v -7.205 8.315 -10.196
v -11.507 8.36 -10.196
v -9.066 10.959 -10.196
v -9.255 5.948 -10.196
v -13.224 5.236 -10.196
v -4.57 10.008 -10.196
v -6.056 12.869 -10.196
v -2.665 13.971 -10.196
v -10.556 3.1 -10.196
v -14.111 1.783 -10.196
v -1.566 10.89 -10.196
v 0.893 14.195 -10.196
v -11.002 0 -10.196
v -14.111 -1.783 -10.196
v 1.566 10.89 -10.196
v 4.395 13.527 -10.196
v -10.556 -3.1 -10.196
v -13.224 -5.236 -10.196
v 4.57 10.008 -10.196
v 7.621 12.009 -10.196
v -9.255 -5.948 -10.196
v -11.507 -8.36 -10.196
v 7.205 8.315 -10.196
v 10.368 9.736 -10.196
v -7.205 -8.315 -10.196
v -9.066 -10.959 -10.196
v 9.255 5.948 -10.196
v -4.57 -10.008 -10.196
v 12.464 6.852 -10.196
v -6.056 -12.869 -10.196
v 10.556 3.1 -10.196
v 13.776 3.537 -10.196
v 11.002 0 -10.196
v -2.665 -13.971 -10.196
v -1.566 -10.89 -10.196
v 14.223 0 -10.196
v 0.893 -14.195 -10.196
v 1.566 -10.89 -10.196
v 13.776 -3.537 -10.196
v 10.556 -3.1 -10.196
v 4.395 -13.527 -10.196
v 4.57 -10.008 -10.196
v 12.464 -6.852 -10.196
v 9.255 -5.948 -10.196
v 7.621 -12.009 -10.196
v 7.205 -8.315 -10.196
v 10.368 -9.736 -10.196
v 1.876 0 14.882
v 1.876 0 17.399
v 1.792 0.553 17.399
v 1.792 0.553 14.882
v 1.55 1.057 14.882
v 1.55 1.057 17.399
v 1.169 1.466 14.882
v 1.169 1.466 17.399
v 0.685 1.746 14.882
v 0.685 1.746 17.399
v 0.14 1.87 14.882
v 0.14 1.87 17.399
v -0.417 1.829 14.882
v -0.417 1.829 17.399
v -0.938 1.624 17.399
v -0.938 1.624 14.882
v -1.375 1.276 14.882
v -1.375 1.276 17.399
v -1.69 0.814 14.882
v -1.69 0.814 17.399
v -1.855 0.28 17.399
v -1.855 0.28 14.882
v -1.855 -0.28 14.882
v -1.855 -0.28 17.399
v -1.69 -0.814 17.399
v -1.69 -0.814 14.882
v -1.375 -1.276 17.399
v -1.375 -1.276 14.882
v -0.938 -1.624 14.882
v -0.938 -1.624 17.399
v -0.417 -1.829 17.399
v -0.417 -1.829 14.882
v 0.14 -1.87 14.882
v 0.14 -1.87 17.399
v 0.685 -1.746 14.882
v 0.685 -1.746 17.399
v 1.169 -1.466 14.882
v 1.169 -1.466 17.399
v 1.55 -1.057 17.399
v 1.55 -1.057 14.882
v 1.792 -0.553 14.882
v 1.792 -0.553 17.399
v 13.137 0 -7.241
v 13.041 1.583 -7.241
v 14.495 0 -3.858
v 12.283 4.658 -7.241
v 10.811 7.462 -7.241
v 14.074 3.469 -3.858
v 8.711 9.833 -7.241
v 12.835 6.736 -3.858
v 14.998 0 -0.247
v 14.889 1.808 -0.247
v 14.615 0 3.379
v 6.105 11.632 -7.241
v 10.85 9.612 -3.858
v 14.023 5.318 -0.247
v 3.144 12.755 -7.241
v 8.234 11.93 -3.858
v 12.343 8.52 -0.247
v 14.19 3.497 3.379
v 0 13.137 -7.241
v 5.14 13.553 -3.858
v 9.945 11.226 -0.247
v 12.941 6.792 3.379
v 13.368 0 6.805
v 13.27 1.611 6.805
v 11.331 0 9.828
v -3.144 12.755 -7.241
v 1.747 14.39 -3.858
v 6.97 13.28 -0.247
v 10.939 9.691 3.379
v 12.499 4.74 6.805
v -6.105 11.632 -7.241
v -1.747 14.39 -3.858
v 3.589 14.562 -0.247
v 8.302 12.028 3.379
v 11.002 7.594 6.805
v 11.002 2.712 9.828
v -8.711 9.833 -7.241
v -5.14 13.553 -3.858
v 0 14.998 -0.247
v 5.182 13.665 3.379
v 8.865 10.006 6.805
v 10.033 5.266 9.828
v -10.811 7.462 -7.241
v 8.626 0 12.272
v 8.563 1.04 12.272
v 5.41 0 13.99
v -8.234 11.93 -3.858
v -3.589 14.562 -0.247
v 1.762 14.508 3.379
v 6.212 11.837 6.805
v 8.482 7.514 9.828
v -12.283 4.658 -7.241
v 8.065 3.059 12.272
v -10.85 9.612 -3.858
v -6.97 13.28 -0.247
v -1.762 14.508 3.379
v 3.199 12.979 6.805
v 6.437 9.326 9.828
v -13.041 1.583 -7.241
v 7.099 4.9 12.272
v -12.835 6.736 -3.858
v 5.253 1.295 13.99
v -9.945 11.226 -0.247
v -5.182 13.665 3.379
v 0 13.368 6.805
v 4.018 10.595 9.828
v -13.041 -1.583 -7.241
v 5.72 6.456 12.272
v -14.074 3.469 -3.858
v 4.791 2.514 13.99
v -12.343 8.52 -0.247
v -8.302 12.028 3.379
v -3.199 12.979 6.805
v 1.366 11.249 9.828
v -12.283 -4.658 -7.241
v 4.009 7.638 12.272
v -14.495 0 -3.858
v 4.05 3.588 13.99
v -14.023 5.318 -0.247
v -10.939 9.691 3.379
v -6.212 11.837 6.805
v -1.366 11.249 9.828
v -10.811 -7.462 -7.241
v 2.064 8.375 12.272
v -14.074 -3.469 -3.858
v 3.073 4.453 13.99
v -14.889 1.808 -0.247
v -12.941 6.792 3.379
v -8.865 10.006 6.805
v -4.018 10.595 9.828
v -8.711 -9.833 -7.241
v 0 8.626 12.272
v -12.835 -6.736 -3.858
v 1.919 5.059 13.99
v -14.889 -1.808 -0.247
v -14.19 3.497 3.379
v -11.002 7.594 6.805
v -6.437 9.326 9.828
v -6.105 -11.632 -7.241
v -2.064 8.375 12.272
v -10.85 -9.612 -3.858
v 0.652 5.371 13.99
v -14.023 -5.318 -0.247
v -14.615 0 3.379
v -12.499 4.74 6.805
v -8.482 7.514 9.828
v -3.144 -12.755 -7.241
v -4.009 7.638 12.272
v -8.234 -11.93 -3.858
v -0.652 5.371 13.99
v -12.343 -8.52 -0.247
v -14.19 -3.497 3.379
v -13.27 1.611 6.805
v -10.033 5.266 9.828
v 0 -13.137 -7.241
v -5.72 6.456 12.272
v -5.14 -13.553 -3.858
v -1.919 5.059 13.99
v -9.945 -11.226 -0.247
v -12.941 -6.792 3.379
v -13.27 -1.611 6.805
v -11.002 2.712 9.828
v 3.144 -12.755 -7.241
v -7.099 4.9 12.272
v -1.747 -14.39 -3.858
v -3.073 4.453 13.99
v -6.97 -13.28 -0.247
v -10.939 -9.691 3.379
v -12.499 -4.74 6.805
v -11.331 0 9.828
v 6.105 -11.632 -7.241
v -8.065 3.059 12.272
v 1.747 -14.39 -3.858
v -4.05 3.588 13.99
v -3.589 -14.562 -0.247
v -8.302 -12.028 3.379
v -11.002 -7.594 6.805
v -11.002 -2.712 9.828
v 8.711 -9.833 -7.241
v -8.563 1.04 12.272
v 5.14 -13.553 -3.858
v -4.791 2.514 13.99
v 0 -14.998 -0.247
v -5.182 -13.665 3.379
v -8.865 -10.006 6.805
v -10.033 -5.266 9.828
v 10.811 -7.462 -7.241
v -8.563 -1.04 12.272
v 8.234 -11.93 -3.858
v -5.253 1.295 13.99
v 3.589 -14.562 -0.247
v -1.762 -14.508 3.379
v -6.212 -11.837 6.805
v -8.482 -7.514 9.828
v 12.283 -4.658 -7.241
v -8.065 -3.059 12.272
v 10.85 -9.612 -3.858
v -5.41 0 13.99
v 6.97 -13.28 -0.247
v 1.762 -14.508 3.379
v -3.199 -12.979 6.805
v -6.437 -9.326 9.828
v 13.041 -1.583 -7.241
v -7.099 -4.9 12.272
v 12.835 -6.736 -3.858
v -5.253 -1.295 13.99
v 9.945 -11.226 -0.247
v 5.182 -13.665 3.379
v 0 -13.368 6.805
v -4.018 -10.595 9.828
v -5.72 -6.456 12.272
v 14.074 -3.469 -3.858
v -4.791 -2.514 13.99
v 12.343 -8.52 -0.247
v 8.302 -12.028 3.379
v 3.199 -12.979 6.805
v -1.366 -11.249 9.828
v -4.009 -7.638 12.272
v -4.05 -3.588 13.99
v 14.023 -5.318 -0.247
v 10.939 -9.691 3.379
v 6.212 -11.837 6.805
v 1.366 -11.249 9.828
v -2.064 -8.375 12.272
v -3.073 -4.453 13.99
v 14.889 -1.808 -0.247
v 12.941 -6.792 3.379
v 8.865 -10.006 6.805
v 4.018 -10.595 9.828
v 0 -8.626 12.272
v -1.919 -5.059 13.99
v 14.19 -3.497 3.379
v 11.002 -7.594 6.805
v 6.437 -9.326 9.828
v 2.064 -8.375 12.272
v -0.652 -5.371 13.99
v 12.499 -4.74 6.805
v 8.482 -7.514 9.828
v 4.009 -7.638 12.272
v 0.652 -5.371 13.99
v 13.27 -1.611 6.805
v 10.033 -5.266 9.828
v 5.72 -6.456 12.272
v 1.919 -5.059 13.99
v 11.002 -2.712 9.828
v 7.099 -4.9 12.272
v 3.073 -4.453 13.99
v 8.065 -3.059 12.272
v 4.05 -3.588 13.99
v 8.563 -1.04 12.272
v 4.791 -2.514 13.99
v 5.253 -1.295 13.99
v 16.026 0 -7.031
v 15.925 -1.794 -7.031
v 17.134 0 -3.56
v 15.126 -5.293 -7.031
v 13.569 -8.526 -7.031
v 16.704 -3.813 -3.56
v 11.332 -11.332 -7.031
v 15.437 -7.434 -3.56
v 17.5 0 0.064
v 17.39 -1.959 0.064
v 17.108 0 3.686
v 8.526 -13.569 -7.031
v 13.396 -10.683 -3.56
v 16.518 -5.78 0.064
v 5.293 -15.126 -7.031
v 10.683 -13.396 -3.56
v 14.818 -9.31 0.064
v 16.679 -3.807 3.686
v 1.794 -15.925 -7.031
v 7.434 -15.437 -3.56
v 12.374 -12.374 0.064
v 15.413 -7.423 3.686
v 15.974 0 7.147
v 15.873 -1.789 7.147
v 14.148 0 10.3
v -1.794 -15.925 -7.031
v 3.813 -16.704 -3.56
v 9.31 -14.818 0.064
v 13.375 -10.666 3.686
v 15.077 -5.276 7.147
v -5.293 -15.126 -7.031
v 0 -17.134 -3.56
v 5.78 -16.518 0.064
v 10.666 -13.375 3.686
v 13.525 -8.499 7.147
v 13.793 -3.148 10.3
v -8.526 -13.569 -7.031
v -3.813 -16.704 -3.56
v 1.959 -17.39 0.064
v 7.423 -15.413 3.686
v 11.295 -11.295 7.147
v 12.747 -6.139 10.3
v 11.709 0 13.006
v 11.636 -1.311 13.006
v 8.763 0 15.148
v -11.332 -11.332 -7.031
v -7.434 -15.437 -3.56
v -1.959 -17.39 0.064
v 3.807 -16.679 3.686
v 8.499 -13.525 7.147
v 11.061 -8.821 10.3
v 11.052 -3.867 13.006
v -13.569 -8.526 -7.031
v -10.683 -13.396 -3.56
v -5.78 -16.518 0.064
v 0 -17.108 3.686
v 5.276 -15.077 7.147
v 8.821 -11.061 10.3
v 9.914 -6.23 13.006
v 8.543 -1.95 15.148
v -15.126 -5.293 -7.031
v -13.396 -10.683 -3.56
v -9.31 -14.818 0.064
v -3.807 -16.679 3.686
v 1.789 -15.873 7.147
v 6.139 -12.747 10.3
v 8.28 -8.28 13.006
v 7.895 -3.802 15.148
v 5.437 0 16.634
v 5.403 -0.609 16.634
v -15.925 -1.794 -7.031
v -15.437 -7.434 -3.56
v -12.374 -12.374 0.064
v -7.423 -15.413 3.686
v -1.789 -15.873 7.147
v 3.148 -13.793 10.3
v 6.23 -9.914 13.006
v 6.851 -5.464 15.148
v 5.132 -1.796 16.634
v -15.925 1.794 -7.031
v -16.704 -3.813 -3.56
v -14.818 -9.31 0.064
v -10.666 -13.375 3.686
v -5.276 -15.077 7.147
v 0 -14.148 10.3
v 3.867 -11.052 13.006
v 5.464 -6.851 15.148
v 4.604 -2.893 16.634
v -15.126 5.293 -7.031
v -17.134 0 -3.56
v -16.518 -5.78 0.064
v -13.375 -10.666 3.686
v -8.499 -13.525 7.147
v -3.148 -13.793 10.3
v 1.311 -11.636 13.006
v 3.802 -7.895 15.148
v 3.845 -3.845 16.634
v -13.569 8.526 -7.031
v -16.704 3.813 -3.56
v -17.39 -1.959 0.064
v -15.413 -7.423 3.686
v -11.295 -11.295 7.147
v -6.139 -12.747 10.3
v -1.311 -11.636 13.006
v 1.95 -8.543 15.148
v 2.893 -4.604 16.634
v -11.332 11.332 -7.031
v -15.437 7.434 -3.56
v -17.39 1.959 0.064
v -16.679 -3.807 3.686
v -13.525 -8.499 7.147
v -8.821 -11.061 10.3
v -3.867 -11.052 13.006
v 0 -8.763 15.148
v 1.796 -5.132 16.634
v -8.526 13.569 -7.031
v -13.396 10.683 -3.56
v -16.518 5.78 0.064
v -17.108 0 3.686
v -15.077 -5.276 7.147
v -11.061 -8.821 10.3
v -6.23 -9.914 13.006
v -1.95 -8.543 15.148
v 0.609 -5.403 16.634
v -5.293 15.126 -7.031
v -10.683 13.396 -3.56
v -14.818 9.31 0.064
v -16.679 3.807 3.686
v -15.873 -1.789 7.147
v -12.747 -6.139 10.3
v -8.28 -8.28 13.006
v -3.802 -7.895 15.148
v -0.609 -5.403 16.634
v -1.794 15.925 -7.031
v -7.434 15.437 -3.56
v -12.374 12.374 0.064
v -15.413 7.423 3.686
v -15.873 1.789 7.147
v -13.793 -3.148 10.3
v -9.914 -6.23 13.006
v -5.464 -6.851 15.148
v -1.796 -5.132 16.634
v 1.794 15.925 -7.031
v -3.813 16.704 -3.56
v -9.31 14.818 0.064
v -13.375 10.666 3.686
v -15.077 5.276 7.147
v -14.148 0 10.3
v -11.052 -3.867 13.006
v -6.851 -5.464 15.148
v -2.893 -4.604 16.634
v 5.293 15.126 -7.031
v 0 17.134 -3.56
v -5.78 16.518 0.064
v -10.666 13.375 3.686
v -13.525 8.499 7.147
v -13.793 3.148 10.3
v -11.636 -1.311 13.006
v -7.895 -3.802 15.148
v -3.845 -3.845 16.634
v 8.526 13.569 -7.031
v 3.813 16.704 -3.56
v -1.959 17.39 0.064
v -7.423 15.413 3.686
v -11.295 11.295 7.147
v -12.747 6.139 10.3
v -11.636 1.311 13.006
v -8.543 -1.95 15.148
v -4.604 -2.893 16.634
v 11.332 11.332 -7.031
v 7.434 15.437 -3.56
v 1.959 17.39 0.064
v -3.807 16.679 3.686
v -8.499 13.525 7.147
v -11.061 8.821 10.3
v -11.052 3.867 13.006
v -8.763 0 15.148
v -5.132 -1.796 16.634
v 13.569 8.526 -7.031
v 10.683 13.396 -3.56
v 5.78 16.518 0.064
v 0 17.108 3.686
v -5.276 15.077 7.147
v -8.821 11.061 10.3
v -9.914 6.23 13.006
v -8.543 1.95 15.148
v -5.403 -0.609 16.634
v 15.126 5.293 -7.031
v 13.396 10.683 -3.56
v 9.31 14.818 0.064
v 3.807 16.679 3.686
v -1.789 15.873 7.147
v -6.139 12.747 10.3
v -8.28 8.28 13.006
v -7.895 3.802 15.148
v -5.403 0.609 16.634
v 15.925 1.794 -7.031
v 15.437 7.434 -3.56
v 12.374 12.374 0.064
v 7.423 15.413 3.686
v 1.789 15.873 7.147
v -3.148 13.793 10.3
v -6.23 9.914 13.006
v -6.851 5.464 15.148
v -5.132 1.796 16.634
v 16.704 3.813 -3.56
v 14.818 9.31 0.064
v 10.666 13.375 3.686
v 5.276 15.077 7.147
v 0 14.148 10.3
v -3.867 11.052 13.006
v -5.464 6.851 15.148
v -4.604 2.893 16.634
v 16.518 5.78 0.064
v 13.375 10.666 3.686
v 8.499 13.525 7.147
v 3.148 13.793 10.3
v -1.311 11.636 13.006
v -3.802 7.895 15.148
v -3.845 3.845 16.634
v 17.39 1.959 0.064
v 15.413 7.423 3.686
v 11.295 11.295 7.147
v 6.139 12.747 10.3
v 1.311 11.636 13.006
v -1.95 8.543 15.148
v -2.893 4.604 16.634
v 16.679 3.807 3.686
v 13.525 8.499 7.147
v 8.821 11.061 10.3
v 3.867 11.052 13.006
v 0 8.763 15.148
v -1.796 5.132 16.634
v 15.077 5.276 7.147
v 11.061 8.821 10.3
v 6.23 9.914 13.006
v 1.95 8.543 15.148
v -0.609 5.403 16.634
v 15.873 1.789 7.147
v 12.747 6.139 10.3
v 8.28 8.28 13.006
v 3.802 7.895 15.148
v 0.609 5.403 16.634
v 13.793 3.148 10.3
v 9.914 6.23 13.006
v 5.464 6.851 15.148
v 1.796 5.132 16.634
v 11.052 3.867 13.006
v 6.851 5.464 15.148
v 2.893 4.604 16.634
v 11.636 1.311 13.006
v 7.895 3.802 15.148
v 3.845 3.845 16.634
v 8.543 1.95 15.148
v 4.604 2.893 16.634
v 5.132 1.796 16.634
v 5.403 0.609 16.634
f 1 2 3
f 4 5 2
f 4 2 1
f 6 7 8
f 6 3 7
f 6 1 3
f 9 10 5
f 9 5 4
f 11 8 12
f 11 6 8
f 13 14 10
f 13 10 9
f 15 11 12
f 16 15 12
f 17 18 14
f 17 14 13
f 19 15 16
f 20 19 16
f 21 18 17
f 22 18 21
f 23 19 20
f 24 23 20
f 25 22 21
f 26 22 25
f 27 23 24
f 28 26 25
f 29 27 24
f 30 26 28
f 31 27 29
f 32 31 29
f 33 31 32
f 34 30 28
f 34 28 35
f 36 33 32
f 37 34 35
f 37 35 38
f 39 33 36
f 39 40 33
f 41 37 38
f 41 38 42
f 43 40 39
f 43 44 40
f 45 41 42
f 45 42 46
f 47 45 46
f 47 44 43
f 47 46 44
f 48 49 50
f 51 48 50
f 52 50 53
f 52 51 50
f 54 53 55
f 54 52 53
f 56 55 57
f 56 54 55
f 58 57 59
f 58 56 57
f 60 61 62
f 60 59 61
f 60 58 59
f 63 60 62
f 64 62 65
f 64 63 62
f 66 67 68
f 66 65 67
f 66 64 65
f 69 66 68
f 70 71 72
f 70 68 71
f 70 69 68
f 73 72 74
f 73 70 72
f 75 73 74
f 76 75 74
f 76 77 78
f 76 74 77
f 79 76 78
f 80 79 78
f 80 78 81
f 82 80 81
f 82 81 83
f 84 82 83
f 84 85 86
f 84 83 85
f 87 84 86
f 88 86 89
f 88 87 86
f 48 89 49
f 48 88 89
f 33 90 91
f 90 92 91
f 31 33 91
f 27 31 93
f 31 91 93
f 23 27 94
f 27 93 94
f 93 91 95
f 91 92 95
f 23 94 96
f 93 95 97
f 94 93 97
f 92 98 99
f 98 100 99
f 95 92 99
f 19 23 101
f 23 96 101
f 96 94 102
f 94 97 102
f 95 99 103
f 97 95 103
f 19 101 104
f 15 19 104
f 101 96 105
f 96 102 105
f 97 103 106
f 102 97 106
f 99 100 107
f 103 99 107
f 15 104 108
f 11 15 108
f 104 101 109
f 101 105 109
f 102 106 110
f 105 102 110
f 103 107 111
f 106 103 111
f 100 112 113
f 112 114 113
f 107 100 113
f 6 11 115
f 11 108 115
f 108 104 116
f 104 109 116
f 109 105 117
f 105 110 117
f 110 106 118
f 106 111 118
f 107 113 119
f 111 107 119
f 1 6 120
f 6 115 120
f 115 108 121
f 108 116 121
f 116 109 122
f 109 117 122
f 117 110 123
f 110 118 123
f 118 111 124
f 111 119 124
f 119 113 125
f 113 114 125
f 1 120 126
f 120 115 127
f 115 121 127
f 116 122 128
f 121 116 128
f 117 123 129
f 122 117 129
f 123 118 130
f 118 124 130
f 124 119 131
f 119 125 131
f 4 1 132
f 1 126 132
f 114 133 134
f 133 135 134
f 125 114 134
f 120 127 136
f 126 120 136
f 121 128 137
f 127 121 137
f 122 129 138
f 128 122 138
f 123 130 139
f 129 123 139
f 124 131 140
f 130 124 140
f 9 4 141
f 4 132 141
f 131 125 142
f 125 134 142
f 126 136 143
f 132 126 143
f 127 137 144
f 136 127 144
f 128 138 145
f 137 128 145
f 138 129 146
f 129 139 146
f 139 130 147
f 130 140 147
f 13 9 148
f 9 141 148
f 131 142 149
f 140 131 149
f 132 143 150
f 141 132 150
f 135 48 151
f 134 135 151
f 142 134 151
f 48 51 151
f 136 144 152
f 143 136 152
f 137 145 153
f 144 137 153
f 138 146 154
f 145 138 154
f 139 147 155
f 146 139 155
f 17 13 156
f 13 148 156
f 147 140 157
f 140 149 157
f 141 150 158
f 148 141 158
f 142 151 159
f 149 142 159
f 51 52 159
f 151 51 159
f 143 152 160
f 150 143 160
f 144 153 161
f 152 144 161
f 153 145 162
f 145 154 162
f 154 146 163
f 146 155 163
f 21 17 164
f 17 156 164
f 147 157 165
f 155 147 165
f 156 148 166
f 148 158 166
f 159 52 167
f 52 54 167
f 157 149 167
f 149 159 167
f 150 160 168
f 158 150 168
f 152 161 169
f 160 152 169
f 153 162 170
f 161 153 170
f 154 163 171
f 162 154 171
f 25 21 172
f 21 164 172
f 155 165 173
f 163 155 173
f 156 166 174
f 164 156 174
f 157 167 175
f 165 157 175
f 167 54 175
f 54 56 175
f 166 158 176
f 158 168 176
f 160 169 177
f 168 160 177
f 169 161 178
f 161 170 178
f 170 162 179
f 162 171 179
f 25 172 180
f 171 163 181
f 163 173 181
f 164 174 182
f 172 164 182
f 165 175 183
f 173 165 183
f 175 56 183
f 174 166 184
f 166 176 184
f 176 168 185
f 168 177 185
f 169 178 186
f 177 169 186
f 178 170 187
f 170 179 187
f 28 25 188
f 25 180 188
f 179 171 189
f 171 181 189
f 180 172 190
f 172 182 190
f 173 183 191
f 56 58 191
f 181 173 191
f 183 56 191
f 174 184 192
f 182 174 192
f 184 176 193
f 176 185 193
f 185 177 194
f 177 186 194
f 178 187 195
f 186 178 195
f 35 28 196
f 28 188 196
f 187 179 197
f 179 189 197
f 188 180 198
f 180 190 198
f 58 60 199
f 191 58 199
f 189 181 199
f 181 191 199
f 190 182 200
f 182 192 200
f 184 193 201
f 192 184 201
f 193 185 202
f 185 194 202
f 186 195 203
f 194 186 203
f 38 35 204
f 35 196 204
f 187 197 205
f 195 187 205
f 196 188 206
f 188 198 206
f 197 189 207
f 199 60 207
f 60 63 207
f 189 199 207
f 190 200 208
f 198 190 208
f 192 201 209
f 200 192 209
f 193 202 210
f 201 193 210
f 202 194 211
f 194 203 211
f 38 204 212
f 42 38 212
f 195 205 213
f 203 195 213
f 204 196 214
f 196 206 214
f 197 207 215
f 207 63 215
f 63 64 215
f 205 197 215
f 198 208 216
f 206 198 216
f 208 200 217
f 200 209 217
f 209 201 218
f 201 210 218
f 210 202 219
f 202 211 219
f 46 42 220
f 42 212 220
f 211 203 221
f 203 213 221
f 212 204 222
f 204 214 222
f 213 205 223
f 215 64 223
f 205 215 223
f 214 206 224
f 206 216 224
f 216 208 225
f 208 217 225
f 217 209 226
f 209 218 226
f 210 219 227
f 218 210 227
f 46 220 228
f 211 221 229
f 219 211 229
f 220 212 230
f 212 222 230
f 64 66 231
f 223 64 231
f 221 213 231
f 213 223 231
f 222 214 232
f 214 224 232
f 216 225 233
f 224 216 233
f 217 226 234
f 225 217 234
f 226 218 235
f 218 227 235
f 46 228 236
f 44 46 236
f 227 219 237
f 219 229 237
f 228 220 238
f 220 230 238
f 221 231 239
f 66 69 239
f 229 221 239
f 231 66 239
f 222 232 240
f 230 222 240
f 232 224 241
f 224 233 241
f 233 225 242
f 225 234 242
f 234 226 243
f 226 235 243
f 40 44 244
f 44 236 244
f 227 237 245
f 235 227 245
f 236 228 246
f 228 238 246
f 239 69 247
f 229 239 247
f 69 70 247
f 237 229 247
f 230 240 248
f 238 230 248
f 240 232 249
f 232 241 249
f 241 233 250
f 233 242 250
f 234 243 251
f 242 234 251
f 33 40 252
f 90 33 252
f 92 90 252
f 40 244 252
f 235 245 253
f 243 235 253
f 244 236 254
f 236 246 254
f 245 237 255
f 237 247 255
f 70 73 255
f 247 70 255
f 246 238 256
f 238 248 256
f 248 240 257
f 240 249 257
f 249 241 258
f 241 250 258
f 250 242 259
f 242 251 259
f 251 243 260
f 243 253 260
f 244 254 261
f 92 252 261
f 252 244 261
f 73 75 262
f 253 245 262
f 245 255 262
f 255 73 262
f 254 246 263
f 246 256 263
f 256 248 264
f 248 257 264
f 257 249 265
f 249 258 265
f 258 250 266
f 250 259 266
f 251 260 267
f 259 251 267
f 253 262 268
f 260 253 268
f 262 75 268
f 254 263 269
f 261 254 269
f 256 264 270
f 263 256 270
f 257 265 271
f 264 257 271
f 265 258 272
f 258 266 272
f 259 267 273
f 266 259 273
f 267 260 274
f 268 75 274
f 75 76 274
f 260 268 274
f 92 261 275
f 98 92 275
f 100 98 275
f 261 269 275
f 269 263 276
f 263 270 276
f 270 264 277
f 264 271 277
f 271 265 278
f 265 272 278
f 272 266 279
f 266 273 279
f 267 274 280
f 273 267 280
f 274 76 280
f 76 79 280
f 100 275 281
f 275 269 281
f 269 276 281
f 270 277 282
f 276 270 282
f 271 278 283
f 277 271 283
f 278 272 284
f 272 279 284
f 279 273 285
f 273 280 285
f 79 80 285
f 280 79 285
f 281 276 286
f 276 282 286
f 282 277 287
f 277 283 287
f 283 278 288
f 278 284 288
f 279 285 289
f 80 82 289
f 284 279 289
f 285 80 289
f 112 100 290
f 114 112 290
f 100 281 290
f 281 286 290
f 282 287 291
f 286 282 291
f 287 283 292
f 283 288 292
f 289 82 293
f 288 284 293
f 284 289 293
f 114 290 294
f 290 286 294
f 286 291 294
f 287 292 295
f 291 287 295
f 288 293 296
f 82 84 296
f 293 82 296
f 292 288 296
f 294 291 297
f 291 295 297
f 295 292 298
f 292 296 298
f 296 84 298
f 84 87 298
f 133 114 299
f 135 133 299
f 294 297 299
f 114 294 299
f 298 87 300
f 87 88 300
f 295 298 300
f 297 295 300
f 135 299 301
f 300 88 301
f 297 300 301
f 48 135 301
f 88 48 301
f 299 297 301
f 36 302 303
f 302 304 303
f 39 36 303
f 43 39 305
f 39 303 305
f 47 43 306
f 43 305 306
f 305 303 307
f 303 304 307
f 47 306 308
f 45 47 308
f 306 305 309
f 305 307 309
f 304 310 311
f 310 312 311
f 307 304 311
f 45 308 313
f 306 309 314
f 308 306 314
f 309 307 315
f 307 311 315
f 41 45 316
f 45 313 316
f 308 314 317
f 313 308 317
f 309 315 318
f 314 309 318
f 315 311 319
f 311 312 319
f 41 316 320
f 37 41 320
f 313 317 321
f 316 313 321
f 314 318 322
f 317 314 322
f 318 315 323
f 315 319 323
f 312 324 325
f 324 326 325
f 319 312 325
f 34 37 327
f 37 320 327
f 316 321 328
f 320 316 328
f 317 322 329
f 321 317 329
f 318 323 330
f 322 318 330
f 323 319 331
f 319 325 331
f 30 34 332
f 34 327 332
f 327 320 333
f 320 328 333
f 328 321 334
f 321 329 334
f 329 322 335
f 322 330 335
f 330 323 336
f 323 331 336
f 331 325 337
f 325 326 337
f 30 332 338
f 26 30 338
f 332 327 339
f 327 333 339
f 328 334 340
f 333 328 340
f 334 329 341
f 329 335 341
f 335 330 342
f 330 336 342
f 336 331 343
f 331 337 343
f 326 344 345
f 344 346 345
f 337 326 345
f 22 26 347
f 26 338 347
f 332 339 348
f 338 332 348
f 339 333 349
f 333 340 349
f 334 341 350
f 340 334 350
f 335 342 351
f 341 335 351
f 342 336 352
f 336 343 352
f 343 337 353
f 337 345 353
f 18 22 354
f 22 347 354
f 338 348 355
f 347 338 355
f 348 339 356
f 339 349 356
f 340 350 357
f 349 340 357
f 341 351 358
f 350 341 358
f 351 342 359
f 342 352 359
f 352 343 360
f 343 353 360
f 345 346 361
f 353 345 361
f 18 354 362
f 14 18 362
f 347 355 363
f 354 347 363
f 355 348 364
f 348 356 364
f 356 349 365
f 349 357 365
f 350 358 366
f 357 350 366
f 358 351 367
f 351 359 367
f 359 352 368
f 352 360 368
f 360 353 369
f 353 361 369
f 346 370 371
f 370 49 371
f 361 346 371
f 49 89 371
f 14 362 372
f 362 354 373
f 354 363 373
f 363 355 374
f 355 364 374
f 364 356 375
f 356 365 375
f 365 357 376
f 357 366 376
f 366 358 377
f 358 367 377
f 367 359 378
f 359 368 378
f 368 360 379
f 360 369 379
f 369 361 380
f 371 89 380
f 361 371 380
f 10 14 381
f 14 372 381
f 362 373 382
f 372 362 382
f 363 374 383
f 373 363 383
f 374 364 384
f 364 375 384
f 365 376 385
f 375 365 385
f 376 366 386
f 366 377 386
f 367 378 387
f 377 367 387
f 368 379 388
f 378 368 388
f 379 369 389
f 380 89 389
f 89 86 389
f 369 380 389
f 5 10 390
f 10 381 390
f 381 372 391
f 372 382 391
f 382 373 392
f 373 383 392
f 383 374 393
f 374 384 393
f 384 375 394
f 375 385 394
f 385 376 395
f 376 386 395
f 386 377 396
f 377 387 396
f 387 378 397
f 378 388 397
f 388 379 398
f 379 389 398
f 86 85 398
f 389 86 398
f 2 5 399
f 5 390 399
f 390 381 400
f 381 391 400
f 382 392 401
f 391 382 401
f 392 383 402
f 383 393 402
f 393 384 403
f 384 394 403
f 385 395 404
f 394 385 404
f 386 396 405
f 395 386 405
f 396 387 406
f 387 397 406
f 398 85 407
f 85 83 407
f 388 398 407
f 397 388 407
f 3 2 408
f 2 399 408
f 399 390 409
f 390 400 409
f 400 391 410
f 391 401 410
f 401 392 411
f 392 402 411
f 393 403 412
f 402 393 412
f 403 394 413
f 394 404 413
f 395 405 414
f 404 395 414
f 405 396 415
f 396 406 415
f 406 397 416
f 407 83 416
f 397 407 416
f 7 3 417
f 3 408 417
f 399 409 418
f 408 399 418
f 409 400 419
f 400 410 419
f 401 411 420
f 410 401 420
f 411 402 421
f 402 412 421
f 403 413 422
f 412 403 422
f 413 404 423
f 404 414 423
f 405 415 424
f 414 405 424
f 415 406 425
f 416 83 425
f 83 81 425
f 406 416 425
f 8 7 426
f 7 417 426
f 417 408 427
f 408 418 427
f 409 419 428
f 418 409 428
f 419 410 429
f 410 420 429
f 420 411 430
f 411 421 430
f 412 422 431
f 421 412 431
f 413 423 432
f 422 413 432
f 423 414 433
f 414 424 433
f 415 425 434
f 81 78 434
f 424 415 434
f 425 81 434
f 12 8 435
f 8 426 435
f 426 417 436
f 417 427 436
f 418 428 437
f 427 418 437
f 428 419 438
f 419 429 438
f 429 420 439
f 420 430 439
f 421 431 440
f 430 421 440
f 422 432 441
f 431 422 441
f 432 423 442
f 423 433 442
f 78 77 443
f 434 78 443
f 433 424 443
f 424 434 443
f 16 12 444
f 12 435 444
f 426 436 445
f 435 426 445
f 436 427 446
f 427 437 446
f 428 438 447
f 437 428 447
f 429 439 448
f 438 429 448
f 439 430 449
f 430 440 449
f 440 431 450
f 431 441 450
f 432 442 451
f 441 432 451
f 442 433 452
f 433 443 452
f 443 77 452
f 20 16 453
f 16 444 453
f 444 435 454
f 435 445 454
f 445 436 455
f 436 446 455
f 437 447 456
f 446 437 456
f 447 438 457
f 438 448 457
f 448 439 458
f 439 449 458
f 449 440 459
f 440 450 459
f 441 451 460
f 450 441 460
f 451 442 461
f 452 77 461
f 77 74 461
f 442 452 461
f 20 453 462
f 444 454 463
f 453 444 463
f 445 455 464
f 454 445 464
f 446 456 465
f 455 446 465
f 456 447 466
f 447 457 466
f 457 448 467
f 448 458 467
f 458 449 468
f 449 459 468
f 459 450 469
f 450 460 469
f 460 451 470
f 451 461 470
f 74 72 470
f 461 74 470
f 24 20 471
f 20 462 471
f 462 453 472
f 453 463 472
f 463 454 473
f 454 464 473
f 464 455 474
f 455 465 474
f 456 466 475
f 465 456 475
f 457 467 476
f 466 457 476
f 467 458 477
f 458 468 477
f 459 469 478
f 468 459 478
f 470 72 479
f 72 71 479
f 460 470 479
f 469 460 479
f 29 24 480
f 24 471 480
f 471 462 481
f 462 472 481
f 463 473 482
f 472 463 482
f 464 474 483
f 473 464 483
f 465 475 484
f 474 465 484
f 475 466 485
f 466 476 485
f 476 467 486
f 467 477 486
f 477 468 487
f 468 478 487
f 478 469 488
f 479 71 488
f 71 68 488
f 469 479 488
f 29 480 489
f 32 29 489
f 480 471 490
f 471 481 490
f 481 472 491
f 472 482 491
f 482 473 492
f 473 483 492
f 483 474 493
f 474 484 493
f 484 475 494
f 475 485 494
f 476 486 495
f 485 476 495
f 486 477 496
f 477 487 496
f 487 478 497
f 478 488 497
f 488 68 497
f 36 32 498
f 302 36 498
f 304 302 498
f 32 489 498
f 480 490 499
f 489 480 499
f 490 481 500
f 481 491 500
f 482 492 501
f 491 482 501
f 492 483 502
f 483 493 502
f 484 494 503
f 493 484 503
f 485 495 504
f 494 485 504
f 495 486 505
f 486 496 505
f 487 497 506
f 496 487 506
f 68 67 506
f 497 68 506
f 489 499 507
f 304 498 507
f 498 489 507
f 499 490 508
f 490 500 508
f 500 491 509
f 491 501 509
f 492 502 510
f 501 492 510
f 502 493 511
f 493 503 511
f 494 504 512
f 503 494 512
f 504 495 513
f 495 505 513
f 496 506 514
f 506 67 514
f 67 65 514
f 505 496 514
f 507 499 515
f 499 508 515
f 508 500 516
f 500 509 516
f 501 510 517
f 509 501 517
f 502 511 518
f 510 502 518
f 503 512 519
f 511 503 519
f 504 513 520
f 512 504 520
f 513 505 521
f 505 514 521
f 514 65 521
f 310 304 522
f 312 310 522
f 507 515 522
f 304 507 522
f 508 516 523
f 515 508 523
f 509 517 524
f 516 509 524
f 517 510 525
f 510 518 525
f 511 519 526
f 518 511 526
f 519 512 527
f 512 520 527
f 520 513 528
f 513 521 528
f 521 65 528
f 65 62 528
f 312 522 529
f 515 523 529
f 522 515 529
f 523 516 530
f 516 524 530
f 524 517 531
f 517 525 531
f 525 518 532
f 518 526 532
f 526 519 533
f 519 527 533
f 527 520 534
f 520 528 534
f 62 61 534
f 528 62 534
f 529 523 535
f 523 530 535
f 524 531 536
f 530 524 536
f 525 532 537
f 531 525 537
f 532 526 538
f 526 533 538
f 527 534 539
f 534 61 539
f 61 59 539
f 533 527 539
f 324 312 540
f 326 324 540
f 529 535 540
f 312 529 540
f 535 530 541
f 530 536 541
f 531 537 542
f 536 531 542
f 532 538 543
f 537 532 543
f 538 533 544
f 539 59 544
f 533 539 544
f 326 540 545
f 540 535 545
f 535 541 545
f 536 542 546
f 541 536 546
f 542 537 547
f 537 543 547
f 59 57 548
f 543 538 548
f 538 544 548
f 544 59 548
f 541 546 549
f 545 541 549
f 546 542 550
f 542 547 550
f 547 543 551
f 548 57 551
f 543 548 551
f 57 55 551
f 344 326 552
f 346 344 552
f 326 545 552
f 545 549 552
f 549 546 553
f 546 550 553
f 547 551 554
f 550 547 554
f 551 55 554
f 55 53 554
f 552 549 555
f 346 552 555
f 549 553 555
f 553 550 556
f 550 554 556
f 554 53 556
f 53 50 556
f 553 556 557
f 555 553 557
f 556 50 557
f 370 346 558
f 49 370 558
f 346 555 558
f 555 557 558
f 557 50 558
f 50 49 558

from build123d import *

# Parameters (mm, degrees)
F5_W     = 42.267536
F5_H     = 10.794579
F6_DEPTH = 30
F7_R     = 1.875564
F8_DEPTH = 25


with BuildPart() as f1:
    # F0 (on Front) → F1 (revolve)
    with BuildSketch(Plane.XZ):
        with BuildLine():
            Line((0, 0), (0, -17.5))
            ThreePointArc((0, -17.5), (17.5, 0), (0, 17.5))
            Line((0, 17.5), (0, 0))
        make_face()
    revolve(axis=Axis((0, 0, -8.75), (0, 0, -1)))


with BuildPart() as f3:
    # F2 (on Front) → F3 (revolve)
    with BuildSketch(Plane.XZ):
        with BuildLine():
            Line((0, 15), (0, -15))
            ThreePointArc((0, -15), (15, 0), (0, 15))
        make_face()
    revolve(axis=Axis((0, 0, 8.75), (0, 0, 1)))


with BuildPart() as f1_1:
    add(f1.part)

    # F4: cut F3
    add(f3.part, mode=Mode.SUBTRACT)

    # F5 (on Front) → F6 (cut, symmetric)
    with BuildSketch(Plane.XZ):
        with Locations((1.34061, -15.593321)):
            Rectangle(F5_W, F5_H)
    extrude(amount=F6_DEPTH, both=True, mode=Mode.SUBTRACT)

    # F7 (on Top) → F8 (cut)
    with BuildSketch(Plane.XY):
        Circle(F7_R)
    extrude(amount=F8_DEPTH, mode=Mode.SUBTRACT)


solid = f1_1.part
